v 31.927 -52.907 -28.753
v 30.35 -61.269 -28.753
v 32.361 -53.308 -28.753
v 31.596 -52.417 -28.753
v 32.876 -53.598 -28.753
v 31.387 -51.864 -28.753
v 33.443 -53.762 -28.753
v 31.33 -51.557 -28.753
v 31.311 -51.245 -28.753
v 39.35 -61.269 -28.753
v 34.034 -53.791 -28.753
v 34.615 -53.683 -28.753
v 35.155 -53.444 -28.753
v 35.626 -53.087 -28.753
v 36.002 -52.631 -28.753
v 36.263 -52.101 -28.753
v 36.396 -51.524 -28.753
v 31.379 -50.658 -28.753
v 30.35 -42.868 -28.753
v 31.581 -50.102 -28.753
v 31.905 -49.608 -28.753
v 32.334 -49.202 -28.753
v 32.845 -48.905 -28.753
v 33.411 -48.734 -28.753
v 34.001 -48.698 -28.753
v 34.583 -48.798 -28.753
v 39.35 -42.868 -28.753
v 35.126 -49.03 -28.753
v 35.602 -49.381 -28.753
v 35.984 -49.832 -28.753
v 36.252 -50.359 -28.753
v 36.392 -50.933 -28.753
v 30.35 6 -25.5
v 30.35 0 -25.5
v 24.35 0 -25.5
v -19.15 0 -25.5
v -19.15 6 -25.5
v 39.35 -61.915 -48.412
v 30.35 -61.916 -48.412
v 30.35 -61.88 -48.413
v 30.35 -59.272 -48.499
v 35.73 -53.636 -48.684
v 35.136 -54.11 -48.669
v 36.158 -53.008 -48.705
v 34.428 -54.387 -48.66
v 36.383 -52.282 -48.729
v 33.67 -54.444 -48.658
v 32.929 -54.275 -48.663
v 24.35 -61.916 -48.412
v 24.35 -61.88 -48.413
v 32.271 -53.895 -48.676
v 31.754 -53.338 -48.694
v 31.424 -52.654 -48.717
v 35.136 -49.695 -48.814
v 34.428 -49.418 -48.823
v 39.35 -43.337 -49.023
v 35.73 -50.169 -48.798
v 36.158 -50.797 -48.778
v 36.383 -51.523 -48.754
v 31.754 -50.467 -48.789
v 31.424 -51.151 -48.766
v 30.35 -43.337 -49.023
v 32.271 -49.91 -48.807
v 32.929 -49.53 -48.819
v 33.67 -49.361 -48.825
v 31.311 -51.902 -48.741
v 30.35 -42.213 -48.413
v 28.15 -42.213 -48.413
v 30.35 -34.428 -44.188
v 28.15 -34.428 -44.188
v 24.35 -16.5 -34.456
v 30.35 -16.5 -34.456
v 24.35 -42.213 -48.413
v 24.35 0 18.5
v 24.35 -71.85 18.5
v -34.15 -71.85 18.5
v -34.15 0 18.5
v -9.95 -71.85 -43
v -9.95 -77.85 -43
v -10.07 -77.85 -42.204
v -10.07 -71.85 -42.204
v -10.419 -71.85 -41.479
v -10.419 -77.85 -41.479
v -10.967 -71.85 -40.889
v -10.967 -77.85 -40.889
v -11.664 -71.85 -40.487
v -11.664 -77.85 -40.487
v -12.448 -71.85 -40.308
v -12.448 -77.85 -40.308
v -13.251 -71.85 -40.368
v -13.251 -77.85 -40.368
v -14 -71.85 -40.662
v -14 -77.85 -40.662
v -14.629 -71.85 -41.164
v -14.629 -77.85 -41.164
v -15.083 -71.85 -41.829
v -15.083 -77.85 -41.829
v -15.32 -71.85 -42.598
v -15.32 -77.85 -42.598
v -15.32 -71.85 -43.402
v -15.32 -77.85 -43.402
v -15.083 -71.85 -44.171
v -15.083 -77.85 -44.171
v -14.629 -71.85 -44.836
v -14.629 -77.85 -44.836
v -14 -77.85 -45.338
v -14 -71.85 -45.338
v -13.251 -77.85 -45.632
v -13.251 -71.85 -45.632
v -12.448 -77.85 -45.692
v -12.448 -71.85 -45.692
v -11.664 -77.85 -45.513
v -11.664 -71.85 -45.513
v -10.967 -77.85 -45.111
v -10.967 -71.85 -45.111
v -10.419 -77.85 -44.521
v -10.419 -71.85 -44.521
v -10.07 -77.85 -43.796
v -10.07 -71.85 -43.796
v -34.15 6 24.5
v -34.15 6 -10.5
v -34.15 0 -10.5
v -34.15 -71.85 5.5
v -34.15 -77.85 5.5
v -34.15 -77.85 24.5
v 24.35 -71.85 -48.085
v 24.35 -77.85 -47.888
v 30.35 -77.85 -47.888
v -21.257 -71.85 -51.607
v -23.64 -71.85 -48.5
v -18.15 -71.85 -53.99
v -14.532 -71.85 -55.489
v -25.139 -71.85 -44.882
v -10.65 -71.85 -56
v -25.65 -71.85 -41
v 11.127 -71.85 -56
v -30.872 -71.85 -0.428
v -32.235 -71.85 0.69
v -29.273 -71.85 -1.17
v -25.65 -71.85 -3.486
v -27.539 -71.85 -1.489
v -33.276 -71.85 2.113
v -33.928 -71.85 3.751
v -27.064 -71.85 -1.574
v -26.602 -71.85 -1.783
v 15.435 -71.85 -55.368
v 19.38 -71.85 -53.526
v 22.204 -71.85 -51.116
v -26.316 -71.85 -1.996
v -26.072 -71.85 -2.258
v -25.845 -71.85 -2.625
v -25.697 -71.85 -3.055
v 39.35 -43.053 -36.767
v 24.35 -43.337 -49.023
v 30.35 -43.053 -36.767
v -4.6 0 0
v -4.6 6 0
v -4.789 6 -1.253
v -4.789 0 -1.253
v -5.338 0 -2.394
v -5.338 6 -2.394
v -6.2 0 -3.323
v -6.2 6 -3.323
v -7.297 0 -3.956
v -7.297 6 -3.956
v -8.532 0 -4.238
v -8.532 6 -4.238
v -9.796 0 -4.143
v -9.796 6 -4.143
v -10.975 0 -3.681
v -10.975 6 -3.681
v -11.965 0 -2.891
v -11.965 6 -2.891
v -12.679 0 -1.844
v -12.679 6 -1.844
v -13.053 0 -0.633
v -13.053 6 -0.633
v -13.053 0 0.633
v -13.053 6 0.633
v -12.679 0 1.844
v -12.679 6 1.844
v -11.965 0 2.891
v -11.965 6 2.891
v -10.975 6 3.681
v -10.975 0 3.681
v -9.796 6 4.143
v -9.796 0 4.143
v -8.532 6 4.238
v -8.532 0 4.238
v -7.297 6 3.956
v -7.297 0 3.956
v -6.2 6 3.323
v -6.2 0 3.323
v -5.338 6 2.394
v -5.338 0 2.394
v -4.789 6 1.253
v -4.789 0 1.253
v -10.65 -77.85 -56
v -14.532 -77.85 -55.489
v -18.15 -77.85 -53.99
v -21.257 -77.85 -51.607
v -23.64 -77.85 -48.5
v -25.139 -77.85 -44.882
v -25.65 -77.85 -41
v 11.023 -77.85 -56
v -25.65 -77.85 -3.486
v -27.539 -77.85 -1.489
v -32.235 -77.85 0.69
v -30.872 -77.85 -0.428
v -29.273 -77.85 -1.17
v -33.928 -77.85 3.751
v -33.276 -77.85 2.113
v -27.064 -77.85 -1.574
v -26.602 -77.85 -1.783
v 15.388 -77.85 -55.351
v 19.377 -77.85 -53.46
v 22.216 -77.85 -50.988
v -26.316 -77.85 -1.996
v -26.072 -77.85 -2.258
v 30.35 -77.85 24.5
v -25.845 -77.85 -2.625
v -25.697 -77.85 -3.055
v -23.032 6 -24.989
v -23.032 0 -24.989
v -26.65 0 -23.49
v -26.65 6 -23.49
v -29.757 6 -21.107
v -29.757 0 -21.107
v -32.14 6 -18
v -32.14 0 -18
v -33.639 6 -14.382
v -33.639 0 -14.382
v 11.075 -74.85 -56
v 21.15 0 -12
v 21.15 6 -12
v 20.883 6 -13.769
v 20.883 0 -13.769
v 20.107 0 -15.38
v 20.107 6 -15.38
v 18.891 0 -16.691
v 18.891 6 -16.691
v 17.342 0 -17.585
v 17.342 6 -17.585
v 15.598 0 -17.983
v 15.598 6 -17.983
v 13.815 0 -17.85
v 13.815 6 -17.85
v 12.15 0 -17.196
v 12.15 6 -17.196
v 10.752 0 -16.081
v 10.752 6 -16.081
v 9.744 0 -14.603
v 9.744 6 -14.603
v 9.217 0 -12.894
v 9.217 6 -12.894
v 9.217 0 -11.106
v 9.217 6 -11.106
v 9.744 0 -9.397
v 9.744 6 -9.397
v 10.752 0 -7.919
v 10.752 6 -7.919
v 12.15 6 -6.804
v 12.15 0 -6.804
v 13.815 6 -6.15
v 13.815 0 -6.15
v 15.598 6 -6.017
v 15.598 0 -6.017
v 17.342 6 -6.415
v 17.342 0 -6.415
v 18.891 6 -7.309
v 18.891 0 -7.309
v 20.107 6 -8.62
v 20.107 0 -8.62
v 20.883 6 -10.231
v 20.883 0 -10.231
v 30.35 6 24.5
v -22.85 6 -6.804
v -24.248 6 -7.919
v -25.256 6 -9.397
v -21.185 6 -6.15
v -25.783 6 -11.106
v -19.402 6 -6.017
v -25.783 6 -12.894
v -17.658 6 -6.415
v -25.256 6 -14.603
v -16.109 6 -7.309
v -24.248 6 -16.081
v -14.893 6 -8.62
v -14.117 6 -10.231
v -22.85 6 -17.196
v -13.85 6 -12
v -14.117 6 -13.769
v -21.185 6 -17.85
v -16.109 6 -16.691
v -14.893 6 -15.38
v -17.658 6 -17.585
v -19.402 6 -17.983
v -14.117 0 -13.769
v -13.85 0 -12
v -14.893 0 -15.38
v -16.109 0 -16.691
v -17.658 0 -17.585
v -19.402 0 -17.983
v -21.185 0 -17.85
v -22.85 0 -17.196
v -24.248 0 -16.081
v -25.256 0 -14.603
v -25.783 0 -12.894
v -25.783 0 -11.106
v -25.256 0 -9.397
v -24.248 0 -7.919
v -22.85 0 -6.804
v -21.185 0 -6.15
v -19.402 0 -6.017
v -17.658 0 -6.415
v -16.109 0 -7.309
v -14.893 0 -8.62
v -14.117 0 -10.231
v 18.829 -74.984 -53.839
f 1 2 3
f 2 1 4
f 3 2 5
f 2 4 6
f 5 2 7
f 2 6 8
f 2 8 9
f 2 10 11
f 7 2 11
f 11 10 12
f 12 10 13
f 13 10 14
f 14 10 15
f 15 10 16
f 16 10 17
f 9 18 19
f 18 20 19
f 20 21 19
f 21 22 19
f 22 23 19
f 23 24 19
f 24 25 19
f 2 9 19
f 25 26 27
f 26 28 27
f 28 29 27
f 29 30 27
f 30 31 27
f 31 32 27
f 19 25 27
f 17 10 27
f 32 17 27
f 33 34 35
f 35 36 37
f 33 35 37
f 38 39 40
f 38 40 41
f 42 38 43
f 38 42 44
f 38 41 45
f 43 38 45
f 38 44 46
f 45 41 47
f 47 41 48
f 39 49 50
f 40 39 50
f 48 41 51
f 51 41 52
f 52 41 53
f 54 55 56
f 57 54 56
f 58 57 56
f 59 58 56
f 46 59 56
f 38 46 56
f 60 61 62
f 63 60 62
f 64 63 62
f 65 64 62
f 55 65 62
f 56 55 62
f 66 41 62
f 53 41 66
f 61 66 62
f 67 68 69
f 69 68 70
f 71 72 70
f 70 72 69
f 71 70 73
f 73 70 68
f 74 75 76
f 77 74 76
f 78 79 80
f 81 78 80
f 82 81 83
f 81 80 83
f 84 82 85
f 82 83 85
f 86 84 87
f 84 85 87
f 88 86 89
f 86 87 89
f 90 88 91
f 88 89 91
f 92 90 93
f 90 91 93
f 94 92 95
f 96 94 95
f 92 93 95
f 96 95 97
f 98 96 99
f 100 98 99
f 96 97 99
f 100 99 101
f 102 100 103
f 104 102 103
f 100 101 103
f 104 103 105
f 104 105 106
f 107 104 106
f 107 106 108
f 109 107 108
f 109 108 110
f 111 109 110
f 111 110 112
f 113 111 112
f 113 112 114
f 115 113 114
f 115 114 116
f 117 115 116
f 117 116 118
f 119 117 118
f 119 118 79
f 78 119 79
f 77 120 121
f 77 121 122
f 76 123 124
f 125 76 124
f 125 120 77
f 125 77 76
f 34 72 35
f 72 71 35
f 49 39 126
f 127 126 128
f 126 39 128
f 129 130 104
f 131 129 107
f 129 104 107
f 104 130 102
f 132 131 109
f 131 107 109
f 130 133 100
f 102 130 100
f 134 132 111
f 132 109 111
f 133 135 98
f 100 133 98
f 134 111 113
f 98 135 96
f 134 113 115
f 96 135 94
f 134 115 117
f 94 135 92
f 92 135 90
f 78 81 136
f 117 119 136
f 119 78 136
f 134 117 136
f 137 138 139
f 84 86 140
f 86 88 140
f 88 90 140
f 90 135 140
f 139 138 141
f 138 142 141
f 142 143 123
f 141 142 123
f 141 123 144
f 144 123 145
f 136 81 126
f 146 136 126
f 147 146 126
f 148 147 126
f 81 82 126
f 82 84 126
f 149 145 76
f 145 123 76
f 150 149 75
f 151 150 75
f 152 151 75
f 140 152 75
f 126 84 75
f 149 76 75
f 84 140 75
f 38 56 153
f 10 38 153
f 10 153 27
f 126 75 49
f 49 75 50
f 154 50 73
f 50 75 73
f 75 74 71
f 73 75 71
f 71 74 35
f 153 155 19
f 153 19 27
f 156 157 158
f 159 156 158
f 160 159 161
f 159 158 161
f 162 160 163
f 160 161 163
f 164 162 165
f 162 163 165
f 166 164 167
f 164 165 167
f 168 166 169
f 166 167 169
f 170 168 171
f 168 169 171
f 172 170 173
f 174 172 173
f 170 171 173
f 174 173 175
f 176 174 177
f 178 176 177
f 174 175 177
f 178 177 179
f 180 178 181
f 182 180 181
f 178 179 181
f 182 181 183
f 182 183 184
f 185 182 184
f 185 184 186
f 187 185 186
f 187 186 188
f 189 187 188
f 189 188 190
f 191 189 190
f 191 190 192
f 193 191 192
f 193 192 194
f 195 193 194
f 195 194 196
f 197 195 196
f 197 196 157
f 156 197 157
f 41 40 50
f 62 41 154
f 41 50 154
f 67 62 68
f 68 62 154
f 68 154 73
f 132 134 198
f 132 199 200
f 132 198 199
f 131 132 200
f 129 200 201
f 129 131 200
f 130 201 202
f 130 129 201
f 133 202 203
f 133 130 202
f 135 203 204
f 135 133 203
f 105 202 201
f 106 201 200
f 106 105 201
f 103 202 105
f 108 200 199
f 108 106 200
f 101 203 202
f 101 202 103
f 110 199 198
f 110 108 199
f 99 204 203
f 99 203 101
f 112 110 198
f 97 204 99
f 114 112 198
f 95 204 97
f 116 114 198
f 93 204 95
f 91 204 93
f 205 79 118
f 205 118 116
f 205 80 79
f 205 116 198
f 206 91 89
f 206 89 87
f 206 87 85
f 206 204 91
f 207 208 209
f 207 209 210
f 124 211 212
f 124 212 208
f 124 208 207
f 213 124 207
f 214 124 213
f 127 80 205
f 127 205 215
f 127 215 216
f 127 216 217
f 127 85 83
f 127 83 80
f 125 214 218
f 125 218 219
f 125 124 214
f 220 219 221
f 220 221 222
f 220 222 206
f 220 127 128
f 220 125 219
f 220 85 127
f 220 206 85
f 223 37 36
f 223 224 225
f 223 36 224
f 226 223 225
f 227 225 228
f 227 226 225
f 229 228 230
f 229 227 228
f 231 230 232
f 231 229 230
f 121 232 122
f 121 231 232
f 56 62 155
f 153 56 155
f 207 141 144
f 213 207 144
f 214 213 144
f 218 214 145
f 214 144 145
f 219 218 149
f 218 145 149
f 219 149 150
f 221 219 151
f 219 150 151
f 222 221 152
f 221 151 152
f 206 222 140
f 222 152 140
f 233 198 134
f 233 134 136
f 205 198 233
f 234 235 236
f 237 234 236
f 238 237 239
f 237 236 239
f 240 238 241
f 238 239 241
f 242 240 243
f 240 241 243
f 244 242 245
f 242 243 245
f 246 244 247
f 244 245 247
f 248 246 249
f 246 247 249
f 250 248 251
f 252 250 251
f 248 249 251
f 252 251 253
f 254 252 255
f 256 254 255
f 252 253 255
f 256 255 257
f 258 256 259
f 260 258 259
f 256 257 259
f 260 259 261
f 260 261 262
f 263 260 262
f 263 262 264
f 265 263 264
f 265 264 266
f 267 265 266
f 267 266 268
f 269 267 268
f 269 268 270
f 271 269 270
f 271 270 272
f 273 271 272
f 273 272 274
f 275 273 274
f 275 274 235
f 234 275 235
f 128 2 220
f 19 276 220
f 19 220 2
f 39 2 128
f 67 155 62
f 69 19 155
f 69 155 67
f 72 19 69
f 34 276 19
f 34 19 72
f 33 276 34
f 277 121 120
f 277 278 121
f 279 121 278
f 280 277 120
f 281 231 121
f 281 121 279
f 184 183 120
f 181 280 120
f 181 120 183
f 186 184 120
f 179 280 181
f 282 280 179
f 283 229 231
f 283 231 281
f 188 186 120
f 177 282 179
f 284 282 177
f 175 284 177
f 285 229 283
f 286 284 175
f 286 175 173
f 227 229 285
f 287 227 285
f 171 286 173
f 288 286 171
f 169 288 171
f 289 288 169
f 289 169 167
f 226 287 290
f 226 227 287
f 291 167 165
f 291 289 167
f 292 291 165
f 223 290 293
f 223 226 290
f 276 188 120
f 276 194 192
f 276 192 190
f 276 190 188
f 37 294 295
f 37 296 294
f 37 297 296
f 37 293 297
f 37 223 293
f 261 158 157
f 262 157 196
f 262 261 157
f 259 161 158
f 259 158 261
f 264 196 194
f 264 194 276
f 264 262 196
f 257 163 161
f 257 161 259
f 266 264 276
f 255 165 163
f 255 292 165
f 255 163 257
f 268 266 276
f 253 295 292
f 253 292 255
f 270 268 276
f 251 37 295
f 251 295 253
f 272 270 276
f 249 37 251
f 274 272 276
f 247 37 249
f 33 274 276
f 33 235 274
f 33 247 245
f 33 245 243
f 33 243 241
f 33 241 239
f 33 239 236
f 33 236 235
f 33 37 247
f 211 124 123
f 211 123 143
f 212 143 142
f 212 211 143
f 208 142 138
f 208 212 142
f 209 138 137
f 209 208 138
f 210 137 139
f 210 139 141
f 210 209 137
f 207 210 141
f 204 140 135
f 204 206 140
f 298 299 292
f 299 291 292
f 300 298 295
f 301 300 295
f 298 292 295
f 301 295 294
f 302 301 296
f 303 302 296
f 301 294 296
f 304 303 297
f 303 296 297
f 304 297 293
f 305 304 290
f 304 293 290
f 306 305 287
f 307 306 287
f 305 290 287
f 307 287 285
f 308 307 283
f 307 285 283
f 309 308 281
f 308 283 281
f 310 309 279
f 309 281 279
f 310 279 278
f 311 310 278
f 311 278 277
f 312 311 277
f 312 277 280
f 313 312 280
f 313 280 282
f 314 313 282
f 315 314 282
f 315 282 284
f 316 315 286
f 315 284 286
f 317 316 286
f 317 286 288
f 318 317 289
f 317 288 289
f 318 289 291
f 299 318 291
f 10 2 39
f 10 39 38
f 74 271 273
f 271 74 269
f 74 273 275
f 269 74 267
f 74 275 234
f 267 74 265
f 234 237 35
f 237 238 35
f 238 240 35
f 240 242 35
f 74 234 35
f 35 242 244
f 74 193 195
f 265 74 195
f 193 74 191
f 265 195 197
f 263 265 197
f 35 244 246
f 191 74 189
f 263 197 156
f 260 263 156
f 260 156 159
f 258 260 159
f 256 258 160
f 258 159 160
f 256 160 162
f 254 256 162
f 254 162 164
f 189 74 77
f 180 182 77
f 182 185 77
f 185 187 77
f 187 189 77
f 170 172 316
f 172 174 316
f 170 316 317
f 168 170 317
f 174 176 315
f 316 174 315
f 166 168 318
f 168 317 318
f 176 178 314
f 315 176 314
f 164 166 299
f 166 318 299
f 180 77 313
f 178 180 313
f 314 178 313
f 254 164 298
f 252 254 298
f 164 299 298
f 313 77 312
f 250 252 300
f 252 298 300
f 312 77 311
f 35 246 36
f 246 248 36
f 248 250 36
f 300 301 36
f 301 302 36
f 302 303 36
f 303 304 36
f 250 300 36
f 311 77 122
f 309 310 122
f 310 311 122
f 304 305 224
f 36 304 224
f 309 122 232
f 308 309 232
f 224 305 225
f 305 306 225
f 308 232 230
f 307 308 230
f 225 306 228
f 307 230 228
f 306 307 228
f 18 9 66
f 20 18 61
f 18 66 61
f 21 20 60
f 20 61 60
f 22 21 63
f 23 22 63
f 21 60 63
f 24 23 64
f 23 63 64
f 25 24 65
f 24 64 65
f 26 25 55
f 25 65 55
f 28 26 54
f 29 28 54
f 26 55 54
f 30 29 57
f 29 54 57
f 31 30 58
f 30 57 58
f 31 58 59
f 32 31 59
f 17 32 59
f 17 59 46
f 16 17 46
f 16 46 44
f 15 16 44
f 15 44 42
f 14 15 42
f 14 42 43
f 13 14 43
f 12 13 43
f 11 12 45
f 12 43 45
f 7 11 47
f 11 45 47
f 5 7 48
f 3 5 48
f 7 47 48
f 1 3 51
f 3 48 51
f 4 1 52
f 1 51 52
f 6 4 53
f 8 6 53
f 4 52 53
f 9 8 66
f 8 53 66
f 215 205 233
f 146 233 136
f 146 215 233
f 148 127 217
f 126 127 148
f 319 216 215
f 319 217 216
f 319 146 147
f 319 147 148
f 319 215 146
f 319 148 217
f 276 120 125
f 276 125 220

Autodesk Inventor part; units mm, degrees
ref_plane "YZ Plane" through (0, 0, 0) normal (1, 0, 0) x (0, 1, 0)
ref_plane "XZ Plane" through (0, 0, 0) normal (0, 1, 0) x (-1, 0, 0)
ref_plane "XY Plane" through (0, 0, 0) normal (0, 0, 1) x (1, 0, 0)
sketch "Sketch1" plane through (0, 0, 0) normal (0, 1, 0) x (-1, 0, 0)
  line L0 (0, -25.5) -> (-34.15, -25.5)
  line L1 (-34.15, -25.5) -> (-34.15, 0)
  line L2 (-34.15, 0) -> (-34.15, 25.5)
  line L3 (-34.15, 25.5) -> (0, 25.5)
  line L4 (0, 25.5) -> (34.15, 25.5)
  line L5 (34.15, 25.5) -> (34.15, 0)
  line L6 (34.15, 0) -> (34.15, -25.5)
  line L7 (34.15, -25.5) -> (0, -25.5)
  point P0 (0, 0)
extrude "Extrusion1" add sketch "Sketch1" along normal blind 7
sketch "Sketch4" plane through (-34.15, 0, -25.5) normal (-1, 0, 0) x (0, 0, 1)
  line L0 (51, 0) -> (51, -78.85)
  line L1 (51, -78.85) -> (-39, -78.85)
  line L2 (-39, -78.85) -> (-39, -71.85)
  line L3 (0, 0) -> (-39, -71.85)
  line L4 (0, 0) -> (51, 0)
  point P0 (25.5, 0)
  dimension "d10" = 90
  dimension "d11" = 7
extrude "Extrusion2" add sketch "Sketch4" against normal blind 7
sketch "Sketch7" plane through (-27.15, 0, -25.5) normal (1, 0, 0) x (0, 0, -1)
  line L0 (-51, -78.85) -> (39, -78.85) projected
  line L1 (-51, -78.85) -> (39, -78.85)
  line L2 (39, -78.85) -> (39, -71.85) projected
  line L3 (39, -78.85) -> (39, -71.85)
  line L4 (39, -71.85) -> (-51, -71.85)
  line L5 (-51, 0) -> (-51, -78.85) projected
  line L6 (-51, -78.85) -> (-51, -71.85)
  point P0 (-25.5, 0)
sketch "Sketch8" plane through (0, 0, 0) normal (0, -1, 0) x (1, 0, 0)
  circle A0 centre (8.15, 0) radius 5 projected
  line L0 (8.15, 18.5) -> (34.15, 18.5)
  line L1 (34.15, 25.5) -> (34.15, -25.5) projected
  line L2 (8.15, 25.5) -> (34.15, 25.5)
  line L3 (8.15, 25.5) -> (-27.15, 25.5)
  line L4 (-27.15, 25.5) -> (-27.15, -25.5) projected
  line L5 (8.15, 18.5) -> (-27.15, 18.5)
  line L6 (34.15, 25.5) -> (34.15, 18.5)
  line L7 (-27.15, 25.5) -> (-27.15, 18.5)
  point P0 (0, 0)
extrude "Extrusion6" add sketch "Sketch7" along normal blind 58.5
extrude "Extrusion7" add sketch "Sketch8" along normal blind 78.75 contours L5 L4 L3 L2 L1 L0
sketch "Sketch9" plane through (31.35, 0, -25.5) normal (1, 0, 0) x (0, 0, -1)
  line L0 (-51, -78.75) -> (-51, 7) projected
  line L1 (-44, 0) -> (-44, -71.85) projected
  line L2 (-51, -78.75) -> (-44, -78.75)
  line L3 (-44, -78.75) -> (-44, -71.85)
  line L4 (-44, -71.85) -> (-51, -71.85)
  line L5 (-51, -71.85) -> (-51, -78.75)
  point P0 (-25.5, 0)
extrude "Extrusion8" cut sketch "Sketch9" along normal blind 10
sketch "Boceto11" plane through (-34.15, -78.85, -64.5) normal (0, -1, 0) x (1, 0, 0)
  line L0 (0, 0) -> (65.5, 0) projected
  line L1 (65.5, 89.9985) -> (65.5, 0)
  line L2 (65.5, 0) -> (71.065, 0)
  line L3 (71.065, 0) -> (71.065, 89.9985)
  line L4 (71.065, 89.9985) -> (65.5, 89.9985)
  line L5 (65.5, 89.9985) -> (65.5, 95.8996)
  line L6 (65.5, 95.8996) -> (71.065, 89.9985)
  point P0 (34.15, 64.5)
extrude "Extrusión9" cut sketch "Boceto11" against normal blind 100
sketch "Boceto12" plane through (31.35, 0, -25.5) normal (1, 0, 0) x (0, 0, -1)
  line L0 (-44, 0) -> (-44, -71.85) projected
  line L1 (-44, 0) -> (-44, -71.85)
  line L2 (39, -71.85) -> (39, -78.85) projected
  line L3 (-44, -71.85) -> (39, -71.85)
  line L4 (-44, 0) -> (0, 0) projected
  line L5 (39, -71.85) -> (0, 0)
  line L6 (0, 0) -> (-44, 0)
  point P0 (-25.5, 0)
extrude "Extrusión10" add sketch "Boceto12" against normal blind 7
sketch "Boceto13" plane through (-34.15, 7, -25.5) normal (-1, 0, 0) x (0, 0, 1)
  line L0 (0, -7) -> (0, 0) projected
  line L1 (44, -7) -> (0, -7) projected
  line L2 (0, -7) -> (44, -7)
  line L3 (44, -78.85) -> (-39, -78.85) projected
  line L4 (44, -7) -> (44, -78.85)
  line L5 (44, -78.85) -> (-39, -78.85)
  line L6 (-39, -78.85) -> (0, -7)
  point P0 (25.5, -7)
extrude "Extrusión11" cut sketch "Boceto13" against normal blind 7
sketch "Boceto19" plane through (-34.15, -78.85, -64.5) normal (0, -1, 0) x (1, 0, 0)
  line L0 (65.5, 90) -> (65.5, 0) projected
  line L1 (65.5, 0) -> (65.5, 40.9323)
  line L2 (81.7334, 40.9323) -> (65.5, 40.9323)
  line L3 (81.7334, 40.9323) -> (81.7334, 0)
  line L4 (81.7334, 0) -> (65.5, 0)
  point P0 (34.15, 64.5)
extrude "Extrusión17" cut sketch "Boceto19" against normal blind 100
sketch "Boceto20" plane through (24.35, 0, -25.5) normal (-1, 0, 0) x (0, 0, 1)
  line L0 (-29.1839, -53.7657) -> (-27.9516, -53.3206) projected
  line L1 (0, 0) -> (-39, -71.85) projected
  line L2 (-29.1839, -53.7657) -> (-27.8697, -51.3447)
  line L3 (-27.8697, -51.3447) -> (-27.9516, -53.3206) projected
  line L4 (-27.8697, -51.3447) -> (-27.9516, -53.3206)
  line L5 (-27.9516, -53.3206) -> (-29.1839, -53.7657)
  point P0 (25.5, 0)
extrude "Extrusión18" add sketch "Boceto20" against normal blind 7
sketch "Boceto27" plane through (31.35, 0, -25.5) normal (1, 0, 0) x (0, 0, -1)
  line L0 (-51, 7) -> (0, 7) projected
  line L1 (0, 7) -> (16.0227, 7)
  line L2 (16.0227, 7) -> (16.0227, -29.5187)
  line L3 (0, 0) -> (39, -71.85) projected
  line L4 (16.0227, -29.5187) -> (0, 0)
  line L5 (0, 0) -> (0, 7)
  point P0 (-25.5, 0)
extrude "Extrusión22" add sketch "Boceto27" against normal blind 7
sketch "Boceto28" plane through (24.35, 0, -25.5) normal (-1, 0, 0) x (0, 0, 1)
  line L0 (-16.0227, -29.5187) -> (-39, -71.85) projected
  line L1 (-16.0227, -29.5187) -> (0, 0)
  line L2 (0, 7) -> (-16.0227, 7) projected
  line L3 (0, 0) -> (0, 7)
  line L4 (0, 7) -> (-16.0227, 7)
  line L5 (-16.0227, 7) -> (-16.0227, -29.5187) projected
  line L6 (-16.0227, 7) -> (-16.0227, -29.5187)
  point P0 (25.5, 0)
extrude "Extrusión23" cut sketch "Boceto28" against normal blind 7
sketch "Boceto31" plane through (-34.15, -78.85, -64.5) normal (0, 0, -1) x (-1, 0, 0)
  line L0 (0, 7) -> (0, 0) projected
  line L1 (0, 0) -> (0, 1)
  line L2 (0, 1) -> (-65.5, 1)
  line L3 (-65.5, 0) -> (-65.5, 85.85) projected
  line L4 (-65.5, 1) -> (-64.5, 1)
  line L5 (-64.5, 1) -> (-64.5, 85.85)
  line L6 (0, 85.85) -> (-65.5, 85.85) projected
  line L7 (-64.5, 85.85) -> (0, 85.85)
  line L8 (0, 85.85) -> (0, 84.85)
  line L9 (0, 0) -> (0, 85.85) projected
  line L10 (0, 84.85) -> (-64.5, 84.85)
  line L11 (-64.5, 85.85) -> (-65.5, 85.85)
  line L12 (0, 0) -> (-65.5, 0) projected
  line L13 (-65.5, 85.85) -> (-65.5, 0)
  line L14 (-65.5, 0) -> (0, 0)
  point P0 (-34.15, 78.85)
  dimension "d84" = 1
  dimension "d85" = 1
  dimension "d86" = 1
extrude "Extrusión26" cut sketch "Boceto31" against normal blind 1000 contours L0 L12 L3 L2 | L10 L5 L6 L8 | L2 L3 L6 L5
sketch "Boceto32" plane through (-34.15, -71.85, 18.5) normal (-1, 0, 0) x (0, 0, 1)
  line L0 (-83, -6) -> (7, -6) projected
  line L1 (7, -6) -> (6, -6)
  line L2 (6, -6) -> (6, 77.85)
  line L3 (7, 77.85) -> (-44, 77.85) projected
  line L4 (7, -6) -> (7, 77.85) projected
  line L5 (6, 77.85) -> (7, 77.85)
  line L6 (7, 77.85) -> (7, -6)
  point P0 (-18.5, 71.85)
  dimension "d89" = 1
extrude "Extrusión27" cut sketch "Boceto32" against normal blind 100
sketch "Boceto33" plane through (-34.15, 6, -25.5) normal (0, 1, 0) x (1, 0, 0)
  line L0 (0, 0) -> (0, -44) projected
  line L1 (0, 0) -> (0, -25.5)
  line L2 (0, -25.5) -> (25.3, -25.5)
  circle A0 centre (25.3, -25.5) radius 4.25
  point P0 (34.15, -25.5)
  dimension "d92" = 25.5
  dimension "d93" = 25.3
  dimension "d94" = 8.5
extrude "Extrusión28" cut sketch "Boceto33" against normal blind 10
sketch "Boceto35" plane through (30.35, -77.85, -64.5) normal (1, 0, 0) x (0, 0, -1)
  circle A0 centre (-24.4828, 41.285) radius 2.6
  point P0 (-64.5, 77.85)
  dimension "d101" = 5.2
extrude "Extrusión29" cut sketch "Boceto35" against normal blind 10
sketch "Boceto37" plane through (30.35, -77.85, -64.5) normal (1, 0, 0) x (0, 0, -1)
  line L0 (-39, 77.85) -> (0, 6) projected
  line L1 (-12.3437, 28.741) -> (-12.3437, 48.1268)
  line L2 (-12.3437, 48.1268) -> (-28.4038, 58.3285)
  line L3 (-12.3437, 28.741) -> (-28.4038, 58.3285)
  point P0 (-64.5, 77.85)
extrude "Extrusión30" add sketch "Boceto37" against normal blind 6
fillet "Empalme3" radius 10 3 edges at (27.35, -29.7232, -52.1563) (27.35, -49.109, -52.1563) (27.35, -19.5215, -36.0962)
sketch "Boceto39" plane through (30.35, -77.85, -64.5) normal (1, 0, 0) x (0, 0, -1)
  line L0 (-6.8274, 18.5782) -> (-18.8698, 18.5782)
  line L1 (-18.8698, 18.5782) -> (-18.2969, 35.7502)
  line L2 (-18.2969, 35.7502) -> (-20.685, 39.2299)
  line L3 (-20.685, 39.2299) -> (-19.4909, 52.6668)
  line L4 (-26.2143, 56.9377) -> (-16.9818, 51.073) projected
  line L5 (-6.8274, 18.5782) -> (-5.5662, 48.0514)
  line L6 (-5.5662, 48.0514) -> (-19.4909, 52.6668)
  point P0 (-64.5, 77.85)
extrude "Extrusión31" cut sketch "Boceto39" against normal blind 2.2
fillet "Empalme4" radius 10 1 edges at (29.25, -25.1832, -45.0091)
sketch "Boceto40" plane through (24.35, 0, -25.5) normal (-1, 0, 0) x (0, 0, 1)
  line L0 (-26.6563, -35.218) -> (-26.6563, -46.57) projected
  line L1 (-26.6563, -35.218) -> (-24.0221, -30.4862) construction
  arc A0 (-12.7857, -20.9123) -> (-9.3588, -17.2419) centre (-18.1476, -12.4713) ccw projected
  line L2 (-24.0221, -30.4862) -> (-10.7107, -19.1566) construction
  spline S0 degree 2 poles (-26.6563, -35.218) (-24.0221, -30.4862) (-10.7107, -19.1566) knots 1 1 1 2 2 2
  line L3 (-26.6563, -35.218) -> (-10.7107, -35.218)
  line L4 (-10.7107, -35.218) -> (-10.7107, -19.1566)
  line L5 (-10.7107, -19.1566) -> (-26.6563, -19.1566)
  line L6 (-26.6563, -19.1566) -> (-26.6563, -35.218)
  point P0 (25.5, 0)
  point P1 (-10.7107, -19.1566)
extrude "Extrusión32" cut sketch "Boceto40" against normal blind 6 contours S0 L6 L5
fillet "Empalme5" radius 10 1 edges at (26.25, -35.218, -52.1563)
sketch "Boceto41" plane through (-34.15, -71.85, 18.5) normal (0, 1, 0) x (1, 0, 0)
  circle A0 centre (11.5, 71.5) radius 5 projected
  circle A1 centre (11.5, 71.5) radius 6
  line L0 (11.5, 71.5) -> (-12.5, 71.5)
  line L1 (-12.5, 71.5) -> (-12.5, 95.5)
  line L2 (-12.5, 95.5) -> (11.5, 95.5)
  line L3 (11.5, 95.5) -> (11.5, 71.5)
  line L4 (64.5, 76.1726) -> (64.5, 83) projected
  line L5 (64.5, 83) -> (64.5, 95.5)
  line L6 (64.5, 95.5) -> (11.5, 95.5)
  line L7 (0, 83) -> (0, -6) projected
  line L8 (0, -6) -> (-12.5, -6)
  line L9 (-12.5, -6) -> (-12.5, 71.5)
  line L10 (64.5, 83) -> (11.5, 83)
  line L11 (0, 83) -> (58.5, 83) projected
  point P0 (34.15, 18.5)
  dimension "d113" = 12
  dimension "d114" = 24
  dimension "d115" = 24
extrude "Extrusión33" add sketch "Boceto41" against normal blind 6 contours L11 L7 L0 L1 L2 L3 | L3 L6 L5 L10 | L7 L8 L9 L0
sketch "Boceto43" plane through (30.35, 6, 24.5) normal (0, 1, 0) x (1, 0, 0)
  circle A0 centre (-39.2, 24.5) radius 4.25 projected
  circle A1 centre (-15.2, 36.5) radius 6
  circle A2 centre (-50.2, 36.5) radius 6
  line L0 (-15.2, 36.5) -> (-50.2, 36.5)
  point P0 (-30.35, 24.5)
  dimension "d126" = 12
  dimension "d127" = 12
  dimension "d240" = 35
extrude "Extrusión35" cut sketch "Boceto43" against normal blind 6 contours A1 | A2
sketch "Boceto44" plane through (24.35, 0, -25.5) normal (-1, 0, 0) x (0, 0, 1)
  line L0 (0, 0) -> (-9.3588, -17.2419) projected
  line L1 (-9.3588, -17.2419) -> (-30.5215, -33.5874)
  line L2 (-30.5215, -33.5874) -> (-30.5215, -56.2301)
  line L3 (-27.8675, -51.3405) -> (-39, -71.85) projected
  arc A0 (-12.666, -20.8351) -> (-9.3588, -17.2419) centre (-18.1476, -12.4713) ccw projected
  line L4 (-30.5215, -56.2301) -> (-9.3588, -17.2419)
  point P0 (25.5, 0)
extrude "Extrusión36" add sketch "Boceto44" against normal blind 6
sketch "Boceto45" plane through (30.35, 0, -25.5) normal (1, 0, 0) x (0, 0, -1)
  line L0 (18.315, -38.6201) -> (18.6875, -34.4282) projected
  line L1 (18.6875, -34.4282) -> (19.9402, -25.4146)
  line L2 (9.3588, -17.2419) -> (30.5215, -33.5874) projected
  line L3 (30.5215, -56.2301) -> (30.5215, -33.5874) projected
  line L4 (19.9402, -25.4146) -> (30.5215, -33.5874)
  line L5 (30.5215, -33.5874) -> (32.1519, -59.2336)
  line L6 (30.5215, -56.2301) -> (39, -71.85) projected
  line L7 (32.1726, -59.2718) -> (20.1302, -59.2718) projected
  line L8 (32.1726, -59.2718) -> (18.315, -38.6201)
  point P0 (-25.5, 0)
extrude "Extrusión37" cut sketch "Boceto45" against normal blind 2.2 contours L0 L1 L2 L3 L6 L8
fillet "Empalme7" radius 4 3 edges at (26.25, -33.5874, -56.0215) (27.35, -17.2419, -34.8588) (26.25, -56.2301, -56.0215)
sketch "Boceto46" plane through (-34.15, -71.85, 18.5) normal (0, 1, 0) x (1, 0, 0)
  line L0 (-12.5, -6) -> (0, -6) projected
  line L1 (0, -6) -> (0, 95.5)
  line L2 (-12.5, 95.5) -> (64.5, 95.5) projected
  line L3 (0, 95.5) -> (-12.5, 95.5)
  line L4 (-12.5, 95.5) -> (-12.5, -6)
  line L5 (-12.5, -6) -> (0, -6)
  point P0 (34.15, 18.5)
extrude "Extrusión38" cut sketch "Boceto46" against normal blind 10
sketch "Sketch48" plane through (-34.15, -71.85, 18.5) normal (0, 1, 0) x (1, 0, 0)
  circle A0 centre (26.5, 69) radius 6 projected
  line L0 (29.7126, 74.0675) -> (26.5, 69)
  circle A1 centre (26.5, 69) radius 18
  line L1 (8.5, 69) -> (8.5, 0)
  line L2 (0, 0) -> (58.5, 0) projected
  line L3 (0, 0) -> (8.5, 0)
  line L4 (26.5, 87) -> (64.5, 87)
  line L5 (64.5, 83) -> (64.5, 95.5) projected
  line L6 (0, 0) -> (0, -6) projected
  line L7 (64.5, 95.5) -> (0, 95.5)
  line L8 (0, 95.5) -> (0, 0)
  point P0 (34.15, 18.5)
  dimension "d142" = 36
extrude "Extrusion40" cut sketch "Sketch48" against normal blind 10 contours A1 L1 L2 L8 L7 L5 L4
sketch "Sketch49" plane through (24.35, 0, 18.5) normal (0, 0, -1) x (-1, 0, 0)
  line L0 (58.5, -77.85) -> (50, -77.85) projected
  line L1 (58.5, -77.85) -> (50, -77.85)
  line L2 (50, -71.85) -> (0, -71.85) projected
  line L3 (50, -77.85) -> (50, -71.85)
  line L4 (50, -71.85) -> (58.5, -71.85)
  line L5 (58.5, -71.85) -> (58.5, -77.85)
  point P0 (24.35, 0)
extrude "Extrusion41" add sketch "Sketch49" along normal blind 20
fillet "Fillet8" radius 7 1 edges at (-34.15, -74.85, -1.5)
fillet "Fillet9" radius 2 1 edges at (-25.65, -74.85, -1.5)
sketch "Sketch52" plane through (30.35, 0, -25.5) normal (1, 0, 0) x (0, 0, -1)
  line L0 (0, 0) -> (-44, 0) projected
  line L1 (32.1726, -59.2718) -> (39, -71.85) projected
  line L2 (0, 0) -> (39, -71.85)
  line L3 (22.9041, -62.1597) -> (23.523, -43.3366)
  line L4 (22.9041, -62.1597) -> (39, -71.85)
  line L5 (39, -71.85) -> (32.1726, -12.8018)
  line L6 (0, 0) -> (0, 6) projected
  line L7 (32.1726, -12.8018) -> (0, 0)
  point P0 (-25.5, 0)
extrude "Extrusion42" cut sketch "Sketch52" against normal blind 10
sketch "Sketch53" plane through (28.15, -77.85, -64.5) normal (1, 0, 0) x (0, 0, -1)
  line L0 (-16.0959, 15.6903) -> (0, 6) projected
  line L1 (-16.001, 18.5782) -> (-15.477, 34.5134) projected
  line L2 (-16.0959, 15.6903) -> (-15.477, 34.5134)
  line L3 (-15.477, 34.5134) -> (-20.7531, 44.2336)
  line L4 (-39, 77.85) -> (-15.477, 34.5134) projected
  line L5 (-20.7531, 44.2336) -> (-21.8828, 18.4708)
  line L6 (-21.8828, 18.4708) -> (-16.0045, 18.4708)
  point P0 (-64.5, 77.85)
extrude "Extrusion43" add sketch "Sketch53" along normal blind 2.2
sketch "Sketch54" plane through (30.35, 0, -25.5) normal (1, 0, 0) x (0, 0, -1)
  circle A0 centre (14.5172, -36.565) radius 2.6 projected
  circle A1 centre (14.5172, -36.565) radius 2.6
  point P0 (-25.5, 0)
extrude "Extrusion44" add sketch "Sketch54" against normal blind 6
sketch "Sketch56" plane through (24.35, 0, -25.5) normal (-1, 0, 0) x (0, 0, 1)
  line L0 (-22.9041, -62.1597) -> (-23.523, -43.3366) projected
  line L1 (-23.523, -43.3366) -> (-22.9041, -62.1597)
  line L2 (-22.9041, -62.1597) -> (-10.8346, -61.7628)
  line L3 (-10.8346, -61.7628) -> (-11.7615, -21.6683)
  line L4 (0, 0) -> (-23.523, -43.3366) projected
  line L5 (-23.523, -43.3366) -> (-11.2671, -43.0533)
  line L6 (-23.523, -43.3366) -> (-22.9041, -62.1597)
  line L7 (-22.9041, -62.1597) -> (-10.8346, -61.7628)
  line L8 (-10.8346, -61.7628) -> (-11.2671, -43.0533)
  line L9 (-11.2671, -43.0533) -> (-23.523, -43.3366)
  point P0 (25.5, 0)
extrude "Extrusion45" add sketch "Sketch56" against normal blind 15 contours L0 L5 L3 L2
sketch "Sketch57" plane through (39.35, -43.3366, -49.023) normal (0, -0.0328631, -0.9994599) x (-1, 0, 0)
  line L0 (0.989, -8.5704) -> (9.989, -8.5704)
  line L1 (9, 46.8938) -> (9, -36.911) projected
  circle A0 centre (5.489, -8.5704) radius 2.55
  line L2 (5.489, -8.5704) -> (0.989, -8.5704)
  line L3 (5.489, -8.5704) -> (-0.011, -8.5704)
  point P0 (39.35, 41.7021)
  dimension "d218" = 5.5
  dimension "d219" = 5.1
extrude "Extrusion46" cut sketch "Sketch57" against normal blind 20
sketch "Sketch59" plane through (30.35, -43.0533, -36.7671) normal (0, 0.9997329, -0.0231118) x (1, 0, 0)
  line L0 (9, 0) -> (9, 12.0754) projected
  line L1 (0, 32.5286) -> (0, -60.4465) projected
  line L2 (9, 0) -> (0, 0)
  line L3 (0, 0) -> (0, -12.412)
  line L4 (0, -12.412) -> (9, -12.412)
  line L5 (9, -12.412) -> (9, 0)
  line L6 (0, -12.412) -> (0, -36.6315)
  line L7 (0, -36.6315) -> (9, -12.412)
  point P0 (-30.35, -37.7523)
extrude "Extrusion47" add sketch "Sketch59" against normal blind 18.7159
sketch "Sketch60" plane through (30.35, 0, -25.5) normal (1, 0, 0) x (0, 0, -1)
  line L0 (22.9041, -62.1597) -> (10.8346, -61.7628) projected
  line L1 (22.9041, -62.1597) -> (-35.3443, -60.8131)
  line L2 (10.8346, -61.7642) -> (-25.7871, -60.9175) projected
  line L3 (-35.3443, -60.8131) -> (-11.8971, -71.85)
  line L4 (-44, -71.85) -> (39, -71.85) projected
  line L5 (22.9041, -62.1597) -> (-11.8971, -71.85)
  point P0 (-25.5, 0)
extrude "Extrusion48" cut sketch "Sketch60" along normal blind 18.7159
sketch "Sketch62" plane through (39.35, -43.3366, -49.023) normal (0, -0.0328631, -0.9994599) x (-1, 0, 0)
  line L0 (9, -18.8333) -> (9, -18.8346) projected
  line L1 (9, -18.8346) -> (-1.0251, -18.8346)
  line L2 (-1.0251, -18.8346) -> (-1.0251, -24.5564)
  line L3 (-1.0251, -24.5564) -> (9, -24.5564)
  line L4 (9, -24.5564) -> (9, -18.8346)
  point P0 (39.35, 41.7021)
extrude "Extrusion49" cut sketch "Sketch62" against normal blind 100
sketch "Sketch63" plane through (39.35, -43.3366, -49.023) normal (0, -0.0328631, -0.9994599) x (-1, 0, 0)
  line L0 (9, 46.8938) -> (9, -36.911) projected
  line L1 (9, -18.5889) -> (-0.3497, -18.5889)
  line L2 (-0.3497, -18.5889) -> (-0.3497, -22.6635)
  line L3 (-0.3497, -22.6635) -> (9, -22.6635)
  line L4 (9, -22.6635) -> (9, -18.5889)
  point P0 (39.35, 41.7021)
  point P1 (9, -22.6635)
extrude "Extrusion50" cut sketch "Sketch63" against normal blind 100
sketch "Sketch64" plane through (-34.15, 6, -25.5) normal (0, 1, 0) x (1, 0, 0)
  line L0 (58.5, -44) -> (58.5, 39) projected
  line L1 (58.5, 23.5443) -> (58.5, 43.0724)
  line L2 (58.5, 43.0724) -> (64.7623, 43.0724)
  line L3 (64.7623, 43.0724) -> (64.7623, 23.523)
  line L4 (64.5, 23.523) -> (73.5, 23.523) projected
  line L5 (58.5, 23.523) -> (64.5, 23.523) projected
  line L6 (58.5, 23.523) -> (64.7623, 23.523)
  point P0 (34.15, -25.5)
extrude "Extrusion51" cut sketch "Sketch64" against normal blind 100
sketch "Sketch66" plane through (-34.15, -77.85, 24.5) normal (0, -1, 0) x (1, 0, 0)
  line L0 (64.5, -73.523) -> (64.5, 0) projected
  line L1 (64.5, -72.9133) -> (58.4721, -72.9133)
  line L2 (58.4721, -72.9133) -> (58.4721, -73.523)
  line L3 (58.4721, -73.523) -> (64.5, -73.523)
  line L4 (64.5, -73.523) -> (64.5, -72.9133)
  point P0 (34.15, -24.5)
extrude "Extrusion52" cut sketch "Sketch66" against normal blind 100
sketch "Sketch67" plane through (24.35, 0, -25.5) normal (-1, 0, 0) x (0, 0, 1)
  line L0 (-22.9121, -61.9155) -> (-23.523, -43.3366) projected
  line L1 (-22.9121, -61.9155) -> (-23.523, -43.3366)
  line L2 (-22.9133, -43.3225) -> (-22.9133, -42.2133) projected
  line L3 (-23.523, -43.3366) -> (-22.9133, -42.2133)
  line L4 (-22.9133, -42.2133) -> (-22.9121, -61.9155)
  point P0 (25.5, 0)
extrude "Extrusion53" add sketch "Sketch67" against normal blind 6
sketch "Sketch70" plane through (30.35, 0, -25.5) normal (1, 0, 0) x (0, 0, -1)
  line L0 (22.9121, -61.9155) -> (23.523, -43.3366) projected
  line L1 (23.523, -43.3366) -> (22.9041, -62.1597) projected
  line L2 (22.9121, -61.9155) -> (22.9041, -62.1597)
  line L3 (22.9041, -62.1597) -> (22.9133, -62.1652)
  line L4 (22.9133, -62.1652) -> (22.9121, -61.9155)
  point P0 (-25.5, 0)
  point P1 (22.9133, -77.85)
extrude "Extrusion54" add sketch "Sketch70" against normal blind 6
sketch "Sketch78" plane through (30.35, -77.85, -48.4133) normal (0, -1, 0) x (1, 0, 0)
  line L0 (-64.5, 72.9133) -> (-43, 72.9133)
  line L1 (-43, 72.9133) -> (-43, 5.4133)
  line L2 (-43, 5.4133) -> (-64.5, 5.4133)
  line L3 (-64.5, 5.4133) -> (-64.5, 72.9133)
  circle A0 centre (-43, 5.4133) radius 2.7
  point P0 (-30.35, 48.4133)
  dimension "d203" = 21.5
  dimension "d204" = 67.5
  dimension "d205" = 5.4
extrude "Extrusion62" cut sketch "Sketch78" against normal blind 10 contours A0 L2 L1 | L1 L2 A0
sketch "Sketch81" plane through (-34.15, -77.85, 24.5) normal (0, -1, 0) x (1, 0, 0)
  circle A0 centre (21.5, -67.5) radius 2.7 projected
  line L0 (21.5, -67.5) -> (21.5, -80.5)
  line L1 (21.5, -80.5) -> (58.5, -80.5)
  line L2 (58.5, -93) -> (58.5, -73.523) projected
  circle A1 centre (21.5, -67.5) radius 2.7
  line L3 (0, 0) -> (64.5, 0) projected
  line L4 (58.5, 0) -> (8.5, 0)
  line L5 (8.5, 0) -> (8.5, -80.5)
  line L6 (8.5, -80.5) -> (58.5, -80.5)
  line L7 (58.5, -80.5) -> (58.5, 0)
  line L8 (58.5, -80.5) -> (8.5, -80.5)
  line L9 (8.5, -80.5) -> (8.5, -99.9184)
  line L10 (8.5, -99.9184) -> (58.5, -99.9184)
  line L11 (58.5, -99.9184) -> (58.5, -80.5)
  point P0 (34.15, -24.5)
  point P1 (8.5, -80.5)
  point P2 (8.5, 0)
  dimension "d224" = 13
extrude "Extrusion67" cut sketch "Sketch81" against normal blind 10 contours L1 L2 L11 L10 L9 L6
extrude "Extrusion68" add sketch "Sketch81" against normal blind 6 contours L6 L5 L3 L7 L2 L1
sketch "Sketch83" plane through (39.35, 0, -25.5) normal (1, 0, 0) x (0, 0, -1)
  line L0 (0, 0) -> (23.523, -43.3366) projected
  line L1 (23.523, -43.3366) -> (23.2095, -52.8715)
  line L2 (23.523, -43.3366) -> (22.9121, -61.9155) projected
  line L3 (23.523, -43.3366) -> (23.2419, -51.887)
  line L4 (23.2419, -51.887) -> (3.2527, -51.2297)
  line L5 (3.2527, -51.2297) -> (3.2527, -61.269)
  line L6 (22.9121, -61.9155) -> (-25.7732, -60.3146) projected
  line L7 (3.2527, -61.269) -> (3.2527, -41.1509)
  line L8 (3.2527, -41.1509) -> (-29.6637, -40.39)
  line L9 (-25.3546, -42.2066) -> (23.523, -43.3366) projected
  line L10 (-29.6637, -40.39) -> (-30.231, -64.9284)
  line L11 (-30.231, -64.9284) -> (3.2527, -61.269)
  point P0 (-25.5, 0)
  point P1 (3.2527, -51.2297)
  dimension "d229" = 20
extrude "Extrusion69" cut sketch "Sketch83" against normal blind 9 contours L7 L5 L11 L10 L8
extrude "Extrusion70" cut sketch "Sketch57" against normal blind 21
sketch "Sketch87" plane through (30.35, 0, -25.5) normal (1, 0, 0) x (0, 0, -1)
  line L0 (0, 0) -> (23.523, -43.3366) projected
  line L1 (23.523, -43.3366) -> (22.3633, -78.6074)
  line L2 (23.523, -43.3366) -> (22.9121, -61.9155) projected
  line L3 (22.3633, -78.6074) -> (29.0342, -79.0987)
  line L4 (29.0342, -79.0987) -> (23.523, -43.3366)
  point P0 (-25.5, 0)
extrude "Extrusion71" cut sketch "Sketch87" against normal blind 6
fillet "Fillet13" radius 15 1 edges at (24.35, -74.85, -56)
fillet "Fillet14" radius 15 2 edges at (-25.65, -74.85, -56) (-34.15, 3, -25.5)
properties part number "DC23[L][F][1]" material "Aluminio 6061"
